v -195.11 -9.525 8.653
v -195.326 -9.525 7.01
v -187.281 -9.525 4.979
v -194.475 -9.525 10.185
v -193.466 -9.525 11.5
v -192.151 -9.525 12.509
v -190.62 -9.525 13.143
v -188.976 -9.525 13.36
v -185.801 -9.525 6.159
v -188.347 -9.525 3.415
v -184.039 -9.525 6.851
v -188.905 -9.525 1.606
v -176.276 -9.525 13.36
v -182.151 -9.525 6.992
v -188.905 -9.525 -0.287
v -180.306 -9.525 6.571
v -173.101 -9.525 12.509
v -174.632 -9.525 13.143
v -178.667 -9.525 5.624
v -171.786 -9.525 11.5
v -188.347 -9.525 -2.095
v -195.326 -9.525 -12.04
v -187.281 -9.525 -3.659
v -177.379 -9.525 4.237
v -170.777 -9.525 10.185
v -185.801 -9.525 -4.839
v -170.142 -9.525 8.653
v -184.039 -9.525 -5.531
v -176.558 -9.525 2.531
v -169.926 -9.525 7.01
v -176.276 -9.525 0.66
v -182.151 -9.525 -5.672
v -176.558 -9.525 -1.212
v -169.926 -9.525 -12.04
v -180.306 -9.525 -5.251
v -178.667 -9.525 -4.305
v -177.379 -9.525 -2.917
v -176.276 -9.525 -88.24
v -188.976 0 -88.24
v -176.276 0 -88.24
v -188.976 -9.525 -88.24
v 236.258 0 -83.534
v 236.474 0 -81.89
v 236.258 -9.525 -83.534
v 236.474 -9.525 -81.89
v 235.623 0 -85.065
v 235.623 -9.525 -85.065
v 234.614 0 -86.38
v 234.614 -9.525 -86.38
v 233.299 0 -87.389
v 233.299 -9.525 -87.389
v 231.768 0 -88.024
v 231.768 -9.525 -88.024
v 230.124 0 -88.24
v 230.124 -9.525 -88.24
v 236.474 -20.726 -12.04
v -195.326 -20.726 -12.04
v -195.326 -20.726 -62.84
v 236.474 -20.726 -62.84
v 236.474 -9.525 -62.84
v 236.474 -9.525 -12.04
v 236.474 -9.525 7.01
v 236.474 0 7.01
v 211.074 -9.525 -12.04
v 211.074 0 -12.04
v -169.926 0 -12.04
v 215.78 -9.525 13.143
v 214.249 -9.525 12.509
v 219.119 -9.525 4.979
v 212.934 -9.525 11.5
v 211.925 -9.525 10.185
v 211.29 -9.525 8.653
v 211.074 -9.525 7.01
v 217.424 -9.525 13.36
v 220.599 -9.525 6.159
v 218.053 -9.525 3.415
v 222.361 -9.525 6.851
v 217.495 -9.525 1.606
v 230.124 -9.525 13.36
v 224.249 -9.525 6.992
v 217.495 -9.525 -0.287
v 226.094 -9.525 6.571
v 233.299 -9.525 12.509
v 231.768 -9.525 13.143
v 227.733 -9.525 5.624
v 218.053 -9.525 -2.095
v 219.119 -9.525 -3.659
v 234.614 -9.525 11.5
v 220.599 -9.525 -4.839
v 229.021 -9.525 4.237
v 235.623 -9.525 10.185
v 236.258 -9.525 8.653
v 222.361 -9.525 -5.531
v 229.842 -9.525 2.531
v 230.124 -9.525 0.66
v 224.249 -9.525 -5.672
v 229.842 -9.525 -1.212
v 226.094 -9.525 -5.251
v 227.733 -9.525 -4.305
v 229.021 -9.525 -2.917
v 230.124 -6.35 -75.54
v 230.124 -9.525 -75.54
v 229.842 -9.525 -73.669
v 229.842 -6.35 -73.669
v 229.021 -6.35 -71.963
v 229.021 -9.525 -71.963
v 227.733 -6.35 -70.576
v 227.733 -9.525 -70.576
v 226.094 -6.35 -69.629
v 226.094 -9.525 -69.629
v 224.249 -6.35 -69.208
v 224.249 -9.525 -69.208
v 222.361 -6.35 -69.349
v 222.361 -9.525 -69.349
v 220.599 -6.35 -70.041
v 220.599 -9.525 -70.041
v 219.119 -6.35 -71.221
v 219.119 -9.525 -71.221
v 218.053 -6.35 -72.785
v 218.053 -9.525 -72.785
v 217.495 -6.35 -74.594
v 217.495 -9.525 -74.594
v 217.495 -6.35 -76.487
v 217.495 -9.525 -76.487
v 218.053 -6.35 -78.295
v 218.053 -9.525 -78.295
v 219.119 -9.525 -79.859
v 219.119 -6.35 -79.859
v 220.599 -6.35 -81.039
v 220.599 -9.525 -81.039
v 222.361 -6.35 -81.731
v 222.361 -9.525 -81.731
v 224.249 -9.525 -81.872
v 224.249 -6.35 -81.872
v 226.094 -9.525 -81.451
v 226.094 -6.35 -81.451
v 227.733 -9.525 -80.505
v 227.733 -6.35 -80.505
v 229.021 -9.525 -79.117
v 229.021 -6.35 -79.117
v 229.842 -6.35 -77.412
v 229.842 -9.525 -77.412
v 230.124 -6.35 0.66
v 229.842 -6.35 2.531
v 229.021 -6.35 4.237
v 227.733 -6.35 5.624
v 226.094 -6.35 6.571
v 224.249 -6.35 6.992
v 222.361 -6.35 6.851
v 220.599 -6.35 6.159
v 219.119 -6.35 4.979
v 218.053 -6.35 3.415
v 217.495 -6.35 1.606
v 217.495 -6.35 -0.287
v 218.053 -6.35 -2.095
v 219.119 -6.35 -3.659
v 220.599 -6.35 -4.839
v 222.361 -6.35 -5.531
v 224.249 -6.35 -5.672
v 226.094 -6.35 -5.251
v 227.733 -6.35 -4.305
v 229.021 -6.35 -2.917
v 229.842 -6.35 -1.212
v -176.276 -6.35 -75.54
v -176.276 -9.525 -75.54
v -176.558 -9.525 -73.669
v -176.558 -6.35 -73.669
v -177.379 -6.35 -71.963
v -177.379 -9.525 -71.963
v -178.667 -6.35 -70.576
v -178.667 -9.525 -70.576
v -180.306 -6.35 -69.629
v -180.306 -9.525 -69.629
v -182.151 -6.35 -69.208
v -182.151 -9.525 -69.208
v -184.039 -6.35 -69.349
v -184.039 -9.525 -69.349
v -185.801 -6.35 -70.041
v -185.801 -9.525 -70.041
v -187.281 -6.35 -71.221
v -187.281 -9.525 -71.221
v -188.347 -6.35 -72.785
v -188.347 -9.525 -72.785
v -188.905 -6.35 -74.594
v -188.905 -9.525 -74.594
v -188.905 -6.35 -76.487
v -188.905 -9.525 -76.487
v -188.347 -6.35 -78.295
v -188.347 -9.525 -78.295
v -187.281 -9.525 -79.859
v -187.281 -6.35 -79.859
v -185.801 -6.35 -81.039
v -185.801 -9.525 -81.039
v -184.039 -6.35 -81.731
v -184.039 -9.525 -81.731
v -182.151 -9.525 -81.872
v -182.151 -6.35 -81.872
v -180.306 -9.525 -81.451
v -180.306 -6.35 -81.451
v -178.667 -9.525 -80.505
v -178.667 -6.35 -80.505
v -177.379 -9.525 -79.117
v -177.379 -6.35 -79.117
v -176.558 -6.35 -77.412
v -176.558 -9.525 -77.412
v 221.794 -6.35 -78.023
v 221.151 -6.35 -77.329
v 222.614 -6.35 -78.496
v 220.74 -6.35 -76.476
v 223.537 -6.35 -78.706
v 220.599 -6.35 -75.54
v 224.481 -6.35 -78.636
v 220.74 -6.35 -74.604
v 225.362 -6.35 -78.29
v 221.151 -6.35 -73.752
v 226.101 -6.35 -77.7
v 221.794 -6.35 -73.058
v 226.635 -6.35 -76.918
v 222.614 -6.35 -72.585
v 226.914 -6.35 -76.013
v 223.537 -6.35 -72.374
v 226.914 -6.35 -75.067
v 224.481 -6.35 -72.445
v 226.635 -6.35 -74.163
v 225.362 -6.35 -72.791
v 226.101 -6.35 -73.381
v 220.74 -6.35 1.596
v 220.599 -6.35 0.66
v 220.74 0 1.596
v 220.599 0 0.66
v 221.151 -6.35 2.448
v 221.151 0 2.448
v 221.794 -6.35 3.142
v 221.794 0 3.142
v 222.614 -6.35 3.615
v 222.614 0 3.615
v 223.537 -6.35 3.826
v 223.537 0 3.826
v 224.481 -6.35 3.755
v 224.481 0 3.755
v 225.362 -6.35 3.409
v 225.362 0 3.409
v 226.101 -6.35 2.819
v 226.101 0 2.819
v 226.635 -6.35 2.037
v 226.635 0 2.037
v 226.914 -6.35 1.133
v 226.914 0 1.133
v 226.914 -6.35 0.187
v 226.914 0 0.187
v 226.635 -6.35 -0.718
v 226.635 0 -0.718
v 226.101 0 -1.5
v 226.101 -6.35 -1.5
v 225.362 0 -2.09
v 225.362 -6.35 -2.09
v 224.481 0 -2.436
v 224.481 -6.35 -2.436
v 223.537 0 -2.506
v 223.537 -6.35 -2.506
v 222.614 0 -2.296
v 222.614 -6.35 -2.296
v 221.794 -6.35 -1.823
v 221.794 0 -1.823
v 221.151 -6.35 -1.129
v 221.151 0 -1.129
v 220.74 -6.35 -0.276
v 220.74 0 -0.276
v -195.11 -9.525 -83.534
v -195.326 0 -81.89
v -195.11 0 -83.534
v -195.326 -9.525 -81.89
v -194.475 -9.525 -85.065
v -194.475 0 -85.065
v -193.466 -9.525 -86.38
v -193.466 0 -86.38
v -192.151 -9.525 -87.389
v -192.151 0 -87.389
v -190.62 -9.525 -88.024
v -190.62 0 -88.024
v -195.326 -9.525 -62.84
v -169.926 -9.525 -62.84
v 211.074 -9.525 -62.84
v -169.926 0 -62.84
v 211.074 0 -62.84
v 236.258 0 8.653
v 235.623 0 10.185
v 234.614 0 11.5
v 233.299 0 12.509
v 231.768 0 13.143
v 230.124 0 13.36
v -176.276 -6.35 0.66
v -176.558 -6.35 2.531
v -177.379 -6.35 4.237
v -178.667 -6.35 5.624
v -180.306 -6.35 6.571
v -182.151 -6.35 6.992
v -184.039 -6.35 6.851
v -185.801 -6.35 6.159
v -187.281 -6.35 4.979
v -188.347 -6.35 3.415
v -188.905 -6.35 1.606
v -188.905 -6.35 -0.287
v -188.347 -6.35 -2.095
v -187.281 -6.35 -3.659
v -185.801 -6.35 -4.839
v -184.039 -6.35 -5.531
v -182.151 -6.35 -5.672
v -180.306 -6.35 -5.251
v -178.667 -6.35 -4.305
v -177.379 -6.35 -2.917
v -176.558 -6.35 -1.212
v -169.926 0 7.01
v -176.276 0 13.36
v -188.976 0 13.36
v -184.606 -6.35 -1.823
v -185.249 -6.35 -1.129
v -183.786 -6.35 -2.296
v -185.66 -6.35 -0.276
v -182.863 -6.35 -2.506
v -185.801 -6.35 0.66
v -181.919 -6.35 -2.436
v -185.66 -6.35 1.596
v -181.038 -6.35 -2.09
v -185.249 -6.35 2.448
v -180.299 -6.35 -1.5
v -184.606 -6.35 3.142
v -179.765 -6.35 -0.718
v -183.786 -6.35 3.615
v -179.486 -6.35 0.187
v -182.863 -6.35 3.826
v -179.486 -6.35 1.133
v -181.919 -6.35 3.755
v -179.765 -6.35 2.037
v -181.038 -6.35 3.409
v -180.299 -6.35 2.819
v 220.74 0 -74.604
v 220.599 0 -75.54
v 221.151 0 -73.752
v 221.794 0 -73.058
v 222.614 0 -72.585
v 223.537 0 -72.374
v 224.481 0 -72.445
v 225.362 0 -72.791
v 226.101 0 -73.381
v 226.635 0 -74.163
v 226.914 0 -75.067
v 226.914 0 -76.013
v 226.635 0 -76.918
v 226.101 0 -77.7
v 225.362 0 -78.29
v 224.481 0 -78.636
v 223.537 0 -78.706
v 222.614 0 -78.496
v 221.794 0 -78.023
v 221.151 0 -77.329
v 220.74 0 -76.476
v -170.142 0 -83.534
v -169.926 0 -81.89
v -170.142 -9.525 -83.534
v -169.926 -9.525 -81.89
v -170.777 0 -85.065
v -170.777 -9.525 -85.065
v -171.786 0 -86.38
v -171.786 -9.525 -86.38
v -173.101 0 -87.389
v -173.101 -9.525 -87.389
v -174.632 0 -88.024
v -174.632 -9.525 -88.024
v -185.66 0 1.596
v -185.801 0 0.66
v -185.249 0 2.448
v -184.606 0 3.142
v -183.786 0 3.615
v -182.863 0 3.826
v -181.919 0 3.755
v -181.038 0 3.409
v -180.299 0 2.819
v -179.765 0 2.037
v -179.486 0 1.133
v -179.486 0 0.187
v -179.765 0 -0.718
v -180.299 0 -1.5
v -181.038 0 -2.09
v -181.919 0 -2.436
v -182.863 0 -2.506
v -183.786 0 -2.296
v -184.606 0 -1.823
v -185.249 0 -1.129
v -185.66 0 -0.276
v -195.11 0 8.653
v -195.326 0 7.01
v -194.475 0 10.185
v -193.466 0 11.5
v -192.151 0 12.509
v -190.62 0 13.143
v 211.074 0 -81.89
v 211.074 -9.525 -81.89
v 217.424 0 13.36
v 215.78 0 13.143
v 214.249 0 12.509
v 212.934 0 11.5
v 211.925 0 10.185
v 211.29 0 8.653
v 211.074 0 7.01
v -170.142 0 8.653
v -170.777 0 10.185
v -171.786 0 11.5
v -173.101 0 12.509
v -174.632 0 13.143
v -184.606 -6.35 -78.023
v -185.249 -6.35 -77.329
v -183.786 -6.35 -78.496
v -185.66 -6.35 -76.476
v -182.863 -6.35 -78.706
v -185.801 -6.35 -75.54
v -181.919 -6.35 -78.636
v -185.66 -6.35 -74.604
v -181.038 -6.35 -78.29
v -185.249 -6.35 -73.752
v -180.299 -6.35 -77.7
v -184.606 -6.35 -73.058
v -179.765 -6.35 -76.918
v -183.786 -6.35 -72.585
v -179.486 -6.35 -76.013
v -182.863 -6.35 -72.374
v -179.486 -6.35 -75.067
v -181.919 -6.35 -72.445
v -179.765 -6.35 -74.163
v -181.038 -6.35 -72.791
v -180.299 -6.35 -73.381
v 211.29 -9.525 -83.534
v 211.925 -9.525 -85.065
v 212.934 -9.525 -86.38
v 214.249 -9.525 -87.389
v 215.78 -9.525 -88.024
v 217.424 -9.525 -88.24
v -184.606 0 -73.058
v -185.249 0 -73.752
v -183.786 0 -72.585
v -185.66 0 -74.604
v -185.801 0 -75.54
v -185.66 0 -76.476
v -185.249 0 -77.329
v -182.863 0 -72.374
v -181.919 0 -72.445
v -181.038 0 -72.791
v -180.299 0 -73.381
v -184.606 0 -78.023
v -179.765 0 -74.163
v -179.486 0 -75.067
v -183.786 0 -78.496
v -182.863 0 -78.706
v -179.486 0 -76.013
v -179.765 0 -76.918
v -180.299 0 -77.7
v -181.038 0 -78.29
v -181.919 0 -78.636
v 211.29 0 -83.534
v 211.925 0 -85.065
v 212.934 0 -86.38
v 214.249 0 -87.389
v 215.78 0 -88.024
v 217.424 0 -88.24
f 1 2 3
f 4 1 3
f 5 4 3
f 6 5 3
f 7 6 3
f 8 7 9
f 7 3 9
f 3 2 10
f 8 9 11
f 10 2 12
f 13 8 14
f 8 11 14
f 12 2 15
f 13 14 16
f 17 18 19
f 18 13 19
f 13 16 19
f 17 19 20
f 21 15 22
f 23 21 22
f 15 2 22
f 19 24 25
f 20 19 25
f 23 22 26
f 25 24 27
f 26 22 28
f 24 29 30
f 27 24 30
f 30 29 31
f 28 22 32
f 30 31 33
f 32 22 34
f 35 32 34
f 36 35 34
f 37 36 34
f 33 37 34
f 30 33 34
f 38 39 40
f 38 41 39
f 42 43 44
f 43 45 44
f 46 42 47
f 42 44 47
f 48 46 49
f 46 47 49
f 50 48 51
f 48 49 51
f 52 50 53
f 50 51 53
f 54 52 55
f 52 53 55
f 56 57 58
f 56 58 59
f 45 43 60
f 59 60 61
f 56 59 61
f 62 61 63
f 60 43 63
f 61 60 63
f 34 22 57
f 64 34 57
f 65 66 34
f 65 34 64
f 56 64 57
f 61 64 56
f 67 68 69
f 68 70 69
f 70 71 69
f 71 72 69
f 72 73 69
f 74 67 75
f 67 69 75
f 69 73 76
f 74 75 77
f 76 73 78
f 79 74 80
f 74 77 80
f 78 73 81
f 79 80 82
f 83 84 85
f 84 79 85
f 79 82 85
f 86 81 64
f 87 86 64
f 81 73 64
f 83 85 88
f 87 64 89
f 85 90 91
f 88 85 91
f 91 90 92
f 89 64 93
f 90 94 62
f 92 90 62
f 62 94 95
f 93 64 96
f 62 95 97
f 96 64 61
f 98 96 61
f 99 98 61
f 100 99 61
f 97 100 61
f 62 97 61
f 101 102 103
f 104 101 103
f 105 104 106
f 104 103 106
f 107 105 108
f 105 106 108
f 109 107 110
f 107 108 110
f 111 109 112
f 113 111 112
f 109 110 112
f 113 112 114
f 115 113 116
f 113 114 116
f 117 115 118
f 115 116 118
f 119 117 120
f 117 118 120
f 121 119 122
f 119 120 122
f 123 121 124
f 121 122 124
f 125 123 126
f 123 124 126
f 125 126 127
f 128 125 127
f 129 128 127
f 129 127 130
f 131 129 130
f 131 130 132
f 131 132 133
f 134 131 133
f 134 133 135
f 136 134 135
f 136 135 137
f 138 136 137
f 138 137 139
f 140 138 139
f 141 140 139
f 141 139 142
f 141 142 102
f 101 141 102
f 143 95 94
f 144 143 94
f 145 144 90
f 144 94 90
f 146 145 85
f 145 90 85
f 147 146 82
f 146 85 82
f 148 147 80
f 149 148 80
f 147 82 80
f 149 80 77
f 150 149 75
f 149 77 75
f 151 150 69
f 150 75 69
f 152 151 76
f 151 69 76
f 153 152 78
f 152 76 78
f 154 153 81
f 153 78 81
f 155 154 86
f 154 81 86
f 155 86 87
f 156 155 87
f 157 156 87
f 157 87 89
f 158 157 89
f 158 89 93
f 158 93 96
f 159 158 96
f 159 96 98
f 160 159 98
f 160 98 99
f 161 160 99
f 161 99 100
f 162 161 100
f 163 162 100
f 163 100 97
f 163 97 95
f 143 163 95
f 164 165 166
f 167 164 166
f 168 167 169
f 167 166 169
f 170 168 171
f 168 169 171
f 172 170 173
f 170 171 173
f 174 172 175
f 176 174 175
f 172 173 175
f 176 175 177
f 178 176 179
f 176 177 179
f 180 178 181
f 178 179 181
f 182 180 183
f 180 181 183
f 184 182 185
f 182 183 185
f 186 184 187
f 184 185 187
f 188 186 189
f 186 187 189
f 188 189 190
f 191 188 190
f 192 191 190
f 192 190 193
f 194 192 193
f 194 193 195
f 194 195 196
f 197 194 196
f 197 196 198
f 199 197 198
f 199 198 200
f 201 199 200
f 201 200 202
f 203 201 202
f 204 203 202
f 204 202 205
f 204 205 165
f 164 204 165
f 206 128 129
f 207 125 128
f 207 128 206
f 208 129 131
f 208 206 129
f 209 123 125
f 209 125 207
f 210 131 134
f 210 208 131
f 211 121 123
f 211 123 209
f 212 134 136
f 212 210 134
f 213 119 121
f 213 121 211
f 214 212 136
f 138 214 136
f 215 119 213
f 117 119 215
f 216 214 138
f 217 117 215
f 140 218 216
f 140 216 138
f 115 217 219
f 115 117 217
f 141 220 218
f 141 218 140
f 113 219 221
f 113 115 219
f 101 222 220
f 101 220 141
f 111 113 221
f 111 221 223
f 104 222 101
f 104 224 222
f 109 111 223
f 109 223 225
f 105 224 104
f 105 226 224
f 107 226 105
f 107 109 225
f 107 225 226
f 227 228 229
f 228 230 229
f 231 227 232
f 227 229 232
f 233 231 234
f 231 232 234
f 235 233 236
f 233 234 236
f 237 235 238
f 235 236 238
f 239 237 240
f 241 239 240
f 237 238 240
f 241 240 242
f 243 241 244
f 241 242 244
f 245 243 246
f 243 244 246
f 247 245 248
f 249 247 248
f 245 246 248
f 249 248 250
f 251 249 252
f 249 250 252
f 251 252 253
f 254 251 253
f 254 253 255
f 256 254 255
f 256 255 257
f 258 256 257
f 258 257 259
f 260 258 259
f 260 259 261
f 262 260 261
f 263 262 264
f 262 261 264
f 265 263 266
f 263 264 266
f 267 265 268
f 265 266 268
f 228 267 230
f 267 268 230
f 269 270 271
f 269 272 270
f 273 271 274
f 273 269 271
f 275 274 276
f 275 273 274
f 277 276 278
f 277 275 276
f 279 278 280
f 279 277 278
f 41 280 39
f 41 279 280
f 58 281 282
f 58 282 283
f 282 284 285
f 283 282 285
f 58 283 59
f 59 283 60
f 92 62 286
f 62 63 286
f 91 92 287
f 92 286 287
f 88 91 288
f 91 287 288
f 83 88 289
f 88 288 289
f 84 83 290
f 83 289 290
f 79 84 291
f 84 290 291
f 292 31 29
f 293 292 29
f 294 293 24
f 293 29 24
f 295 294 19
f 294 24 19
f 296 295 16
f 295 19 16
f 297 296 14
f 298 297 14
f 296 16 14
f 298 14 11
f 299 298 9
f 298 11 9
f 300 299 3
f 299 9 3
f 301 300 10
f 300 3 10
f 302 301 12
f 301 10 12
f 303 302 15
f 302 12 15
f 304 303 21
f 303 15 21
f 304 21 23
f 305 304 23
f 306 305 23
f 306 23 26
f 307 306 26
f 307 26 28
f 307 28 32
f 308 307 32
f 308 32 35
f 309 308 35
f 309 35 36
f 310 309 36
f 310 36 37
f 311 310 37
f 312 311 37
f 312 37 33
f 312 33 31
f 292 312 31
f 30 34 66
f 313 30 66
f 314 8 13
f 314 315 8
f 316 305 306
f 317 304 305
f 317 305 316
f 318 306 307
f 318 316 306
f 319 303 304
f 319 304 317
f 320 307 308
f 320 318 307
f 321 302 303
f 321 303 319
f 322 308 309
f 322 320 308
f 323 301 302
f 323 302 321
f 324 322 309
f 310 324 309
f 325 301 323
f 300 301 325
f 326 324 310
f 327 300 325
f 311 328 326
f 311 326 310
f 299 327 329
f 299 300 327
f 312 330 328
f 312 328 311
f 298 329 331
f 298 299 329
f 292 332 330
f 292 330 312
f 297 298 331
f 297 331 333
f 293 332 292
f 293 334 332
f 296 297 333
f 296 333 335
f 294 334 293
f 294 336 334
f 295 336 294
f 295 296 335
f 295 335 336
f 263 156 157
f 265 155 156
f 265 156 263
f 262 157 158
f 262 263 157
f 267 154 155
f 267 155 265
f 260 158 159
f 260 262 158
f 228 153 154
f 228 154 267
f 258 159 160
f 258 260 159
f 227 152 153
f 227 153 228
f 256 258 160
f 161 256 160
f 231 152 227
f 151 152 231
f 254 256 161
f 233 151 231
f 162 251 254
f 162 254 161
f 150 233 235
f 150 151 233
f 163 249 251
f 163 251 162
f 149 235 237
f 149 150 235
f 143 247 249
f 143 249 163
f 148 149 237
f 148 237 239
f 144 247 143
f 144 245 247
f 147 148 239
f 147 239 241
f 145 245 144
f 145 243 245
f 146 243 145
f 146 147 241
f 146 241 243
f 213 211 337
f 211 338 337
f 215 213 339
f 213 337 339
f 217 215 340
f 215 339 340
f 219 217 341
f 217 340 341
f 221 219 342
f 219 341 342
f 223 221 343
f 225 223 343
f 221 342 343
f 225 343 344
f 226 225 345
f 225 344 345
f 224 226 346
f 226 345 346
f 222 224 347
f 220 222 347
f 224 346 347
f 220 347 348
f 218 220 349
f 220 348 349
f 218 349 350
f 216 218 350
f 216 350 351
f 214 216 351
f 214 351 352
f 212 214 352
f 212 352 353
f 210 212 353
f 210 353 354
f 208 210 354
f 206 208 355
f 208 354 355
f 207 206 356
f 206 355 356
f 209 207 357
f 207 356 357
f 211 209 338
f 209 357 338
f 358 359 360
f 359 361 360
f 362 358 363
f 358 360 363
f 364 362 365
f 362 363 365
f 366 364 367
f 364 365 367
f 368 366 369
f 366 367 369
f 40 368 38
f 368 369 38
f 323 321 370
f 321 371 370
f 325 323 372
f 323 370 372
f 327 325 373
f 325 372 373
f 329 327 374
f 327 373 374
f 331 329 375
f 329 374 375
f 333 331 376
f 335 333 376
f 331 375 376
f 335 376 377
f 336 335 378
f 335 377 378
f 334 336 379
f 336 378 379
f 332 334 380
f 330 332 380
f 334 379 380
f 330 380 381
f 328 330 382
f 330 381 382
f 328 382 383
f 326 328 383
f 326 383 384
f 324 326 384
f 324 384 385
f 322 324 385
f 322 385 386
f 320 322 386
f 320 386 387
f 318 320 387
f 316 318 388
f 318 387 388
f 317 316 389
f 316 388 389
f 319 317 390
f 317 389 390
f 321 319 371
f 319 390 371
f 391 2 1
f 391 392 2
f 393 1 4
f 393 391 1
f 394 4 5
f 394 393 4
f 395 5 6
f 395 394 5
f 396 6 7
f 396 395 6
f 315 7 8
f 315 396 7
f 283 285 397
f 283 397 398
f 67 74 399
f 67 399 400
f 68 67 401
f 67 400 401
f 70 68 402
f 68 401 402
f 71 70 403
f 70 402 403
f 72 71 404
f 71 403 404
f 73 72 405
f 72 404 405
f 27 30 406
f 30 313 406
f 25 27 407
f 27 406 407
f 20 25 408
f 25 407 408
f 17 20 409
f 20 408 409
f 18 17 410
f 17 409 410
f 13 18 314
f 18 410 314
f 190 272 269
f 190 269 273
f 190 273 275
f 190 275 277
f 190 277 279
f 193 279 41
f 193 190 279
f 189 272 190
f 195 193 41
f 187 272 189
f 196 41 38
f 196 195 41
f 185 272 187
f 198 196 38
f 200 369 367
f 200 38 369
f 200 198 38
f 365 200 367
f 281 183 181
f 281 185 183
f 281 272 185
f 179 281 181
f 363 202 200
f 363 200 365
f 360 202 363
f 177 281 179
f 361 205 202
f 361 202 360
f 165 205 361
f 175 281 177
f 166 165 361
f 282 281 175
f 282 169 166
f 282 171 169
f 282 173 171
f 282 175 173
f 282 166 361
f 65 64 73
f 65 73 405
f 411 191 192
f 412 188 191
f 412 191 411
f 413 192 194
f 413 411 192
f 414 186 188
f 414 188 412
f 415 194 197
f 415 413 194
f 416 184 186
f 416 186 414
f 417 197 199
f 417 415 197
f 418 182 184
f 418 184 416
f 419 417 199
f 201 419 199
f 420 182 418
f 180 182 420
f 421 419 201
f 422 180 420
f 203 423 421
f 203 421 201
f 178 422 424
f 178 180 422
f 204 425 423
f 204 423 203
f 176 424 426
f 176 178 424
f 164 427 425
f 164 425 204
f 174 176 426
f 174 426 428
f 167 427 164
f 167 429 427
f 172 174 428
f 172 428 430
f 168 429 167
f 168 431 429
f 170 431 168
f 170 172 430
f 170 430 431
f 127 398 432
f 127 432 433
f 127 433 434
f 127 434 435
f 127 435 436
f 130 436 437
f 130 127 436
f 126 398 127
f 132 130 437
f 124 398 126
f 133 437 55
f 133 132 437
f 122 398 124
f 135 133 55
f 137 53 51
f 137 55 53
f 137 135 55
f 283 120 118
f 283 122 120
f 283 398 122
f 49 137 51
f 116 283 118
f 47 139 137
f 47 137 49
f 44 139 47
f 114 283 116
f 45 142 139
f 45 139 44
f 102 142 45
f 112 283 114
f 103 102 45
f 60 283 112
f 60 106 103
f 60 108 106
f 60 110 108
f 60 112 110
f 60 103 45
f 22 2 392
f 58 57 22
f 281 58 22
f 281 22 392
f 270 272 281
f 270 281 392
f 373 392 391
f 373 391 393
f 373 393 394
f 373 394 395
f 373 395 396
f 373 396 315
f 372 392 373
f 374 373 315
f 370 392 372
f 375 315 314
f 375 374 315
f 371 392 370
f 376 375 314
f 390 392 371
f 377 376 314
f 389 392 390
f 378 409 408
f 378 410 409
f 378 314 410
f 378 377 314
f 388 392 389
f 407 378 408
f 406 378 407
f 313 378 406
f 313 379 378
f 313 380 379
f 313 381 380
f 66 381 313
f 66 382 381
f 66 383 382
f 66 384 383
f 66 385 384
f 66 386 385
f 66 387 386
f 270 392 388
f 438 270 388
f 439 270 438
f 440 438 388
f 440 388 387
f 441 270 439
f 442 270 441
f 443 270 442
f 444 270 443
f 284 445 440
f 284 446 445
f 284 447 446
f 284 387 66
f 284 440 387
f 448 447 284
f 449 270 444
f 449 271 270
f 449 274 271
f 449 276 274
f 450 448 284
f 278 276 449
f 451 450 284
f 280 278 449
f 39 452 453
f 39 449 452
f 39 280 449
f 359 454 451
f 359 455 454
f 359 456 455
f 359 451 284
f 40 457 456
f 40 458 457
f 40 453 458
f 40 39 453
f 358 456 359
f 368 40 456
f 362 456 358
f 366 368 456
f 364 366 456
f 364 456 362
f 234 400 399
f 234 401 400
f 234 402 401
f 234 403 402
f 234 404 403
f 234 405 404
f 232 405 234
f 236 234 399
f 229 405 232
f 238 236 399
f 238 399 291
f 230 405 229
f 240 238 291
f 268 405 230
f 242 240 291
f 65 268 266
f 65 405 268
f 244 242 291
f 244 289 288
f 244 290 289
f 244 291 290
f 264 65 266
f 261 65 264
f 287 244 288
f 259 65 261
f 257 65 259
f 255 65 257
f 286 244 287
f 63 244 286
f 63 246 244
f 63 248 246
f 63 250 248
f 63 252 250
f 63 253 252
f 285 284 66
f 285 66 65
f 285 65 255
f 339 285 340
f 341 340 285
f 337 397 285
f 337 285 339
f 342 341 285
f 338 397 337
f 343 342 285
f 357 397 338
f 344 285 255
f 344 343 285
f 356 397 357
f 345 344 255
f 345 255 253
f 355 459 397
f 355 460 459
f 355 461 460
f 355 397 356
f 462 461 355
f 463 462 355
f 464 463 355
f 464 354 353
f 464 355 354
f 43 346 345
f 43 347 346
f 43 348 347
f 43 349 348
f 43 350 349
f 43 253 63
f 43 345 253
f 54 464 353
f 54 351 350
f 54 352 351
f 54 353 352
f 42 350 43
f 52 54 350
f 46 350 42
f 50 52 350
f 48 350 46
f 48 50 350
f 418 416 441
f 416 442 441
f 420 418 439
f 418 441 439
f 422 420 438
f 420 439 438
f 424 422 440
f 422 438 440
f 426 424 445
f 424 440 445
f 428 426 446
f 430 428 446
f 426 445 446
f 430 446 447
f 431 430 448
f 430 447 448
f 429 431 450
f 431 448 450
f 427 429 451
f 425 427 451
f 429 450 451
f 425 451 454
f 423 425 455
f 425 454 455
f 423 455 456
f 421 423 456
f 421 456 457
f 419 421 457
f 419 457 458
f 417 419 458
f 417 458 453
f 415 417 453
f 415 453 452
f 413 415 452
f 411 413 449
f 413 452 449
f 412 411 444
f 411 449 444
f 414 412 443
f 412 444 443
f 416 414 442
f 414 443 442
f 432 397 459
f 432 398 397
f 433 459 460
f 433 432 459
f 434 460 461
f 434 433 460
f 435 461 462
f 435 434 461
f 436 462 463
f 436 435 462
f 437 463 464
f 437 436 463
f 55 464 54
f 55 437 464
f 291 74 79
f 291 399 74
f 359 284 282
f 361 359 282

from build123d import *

# Parameters (mm, degrees)
F0_W           = 431.8
F0_H           = 50.8
F1_DEPTH       = 20.7264
F2_W           = 25.4
F2_H           = 9.525
F3_DEPTH       = 25.4
F4_W           = 25.4
F4_H           = 9.525
F5_DEPTH       = 25.4
F6_R           = 6.35
F8_D           = 6.35
F8_CBORE_D     = 12.7
F8_CBORE_DEPTH = 3.175


with BuildPart() as f1:
    # F0 (on Front) → F1 (new body)
    with BuildSketch(Plane.XZ):
        with Locations((20.574, -37.44022)):
            Rectangle(F0_W, F0_H)
    extrude(amount=F1_DEPTH)

    # F2 (on face) → F3 (join)
    with BuildSketch(Plane(origin=(0, 0, -62.84022), x_dir=(1, 0, 0), z_dir=(0, 0, -1))):
        with Locations((-182.626, 4.7625)):
            Rectangle(F2_W, F2_H)
        with Locations((223.774, 4.7625)):
            Rectangle(F2_W, F2_H)
    extrude(amount=F3_DEPTH)

    # F4 (on face) → F5 (join)
    with BuildSketch(Plane.XY.offset(-12.04022)):
        with Locations((-182.626, -4.7625)):
            Rectangle(F4_W, F4_H)
        with Locations((223.774, -4.7625)):
            Rectangle(F4_W, F4_H)
    extrude(amount=F5_DEPTH)

    # F6
    f6_edges = [f1.edges().sort_by_distance(p)[0] for p in [
        (236.474, -4.7625, -88.24022),
        (211.074, -4.7625, -88.24022),
        (236.474, -4.7625, 13.35978),
        (211.074, -4.7625, 13.35978),
        (-169.926, -4.7625, 13.35978),
        (-195.326, -4.7625, 13.35978),
        (-195.326, -4.7625, -88.24022),
        (-169.926, -4.7625, -88.24022),
    ]]
    fillet(f6_edges, radius=F6_R)

    # F8 (through all)
    with Locations(Plane.XZ.offset(9.525)):
        with Locations((-182.626, 0.65978), (-182.626, -75.54022), (223.774, 0.65978), (223.774, -75.54022)):
            CounterBoreHole(F8_D / 2, F8_CBORE_D / 2, F8_CBORE_DEPTH)


solid = f1.part
